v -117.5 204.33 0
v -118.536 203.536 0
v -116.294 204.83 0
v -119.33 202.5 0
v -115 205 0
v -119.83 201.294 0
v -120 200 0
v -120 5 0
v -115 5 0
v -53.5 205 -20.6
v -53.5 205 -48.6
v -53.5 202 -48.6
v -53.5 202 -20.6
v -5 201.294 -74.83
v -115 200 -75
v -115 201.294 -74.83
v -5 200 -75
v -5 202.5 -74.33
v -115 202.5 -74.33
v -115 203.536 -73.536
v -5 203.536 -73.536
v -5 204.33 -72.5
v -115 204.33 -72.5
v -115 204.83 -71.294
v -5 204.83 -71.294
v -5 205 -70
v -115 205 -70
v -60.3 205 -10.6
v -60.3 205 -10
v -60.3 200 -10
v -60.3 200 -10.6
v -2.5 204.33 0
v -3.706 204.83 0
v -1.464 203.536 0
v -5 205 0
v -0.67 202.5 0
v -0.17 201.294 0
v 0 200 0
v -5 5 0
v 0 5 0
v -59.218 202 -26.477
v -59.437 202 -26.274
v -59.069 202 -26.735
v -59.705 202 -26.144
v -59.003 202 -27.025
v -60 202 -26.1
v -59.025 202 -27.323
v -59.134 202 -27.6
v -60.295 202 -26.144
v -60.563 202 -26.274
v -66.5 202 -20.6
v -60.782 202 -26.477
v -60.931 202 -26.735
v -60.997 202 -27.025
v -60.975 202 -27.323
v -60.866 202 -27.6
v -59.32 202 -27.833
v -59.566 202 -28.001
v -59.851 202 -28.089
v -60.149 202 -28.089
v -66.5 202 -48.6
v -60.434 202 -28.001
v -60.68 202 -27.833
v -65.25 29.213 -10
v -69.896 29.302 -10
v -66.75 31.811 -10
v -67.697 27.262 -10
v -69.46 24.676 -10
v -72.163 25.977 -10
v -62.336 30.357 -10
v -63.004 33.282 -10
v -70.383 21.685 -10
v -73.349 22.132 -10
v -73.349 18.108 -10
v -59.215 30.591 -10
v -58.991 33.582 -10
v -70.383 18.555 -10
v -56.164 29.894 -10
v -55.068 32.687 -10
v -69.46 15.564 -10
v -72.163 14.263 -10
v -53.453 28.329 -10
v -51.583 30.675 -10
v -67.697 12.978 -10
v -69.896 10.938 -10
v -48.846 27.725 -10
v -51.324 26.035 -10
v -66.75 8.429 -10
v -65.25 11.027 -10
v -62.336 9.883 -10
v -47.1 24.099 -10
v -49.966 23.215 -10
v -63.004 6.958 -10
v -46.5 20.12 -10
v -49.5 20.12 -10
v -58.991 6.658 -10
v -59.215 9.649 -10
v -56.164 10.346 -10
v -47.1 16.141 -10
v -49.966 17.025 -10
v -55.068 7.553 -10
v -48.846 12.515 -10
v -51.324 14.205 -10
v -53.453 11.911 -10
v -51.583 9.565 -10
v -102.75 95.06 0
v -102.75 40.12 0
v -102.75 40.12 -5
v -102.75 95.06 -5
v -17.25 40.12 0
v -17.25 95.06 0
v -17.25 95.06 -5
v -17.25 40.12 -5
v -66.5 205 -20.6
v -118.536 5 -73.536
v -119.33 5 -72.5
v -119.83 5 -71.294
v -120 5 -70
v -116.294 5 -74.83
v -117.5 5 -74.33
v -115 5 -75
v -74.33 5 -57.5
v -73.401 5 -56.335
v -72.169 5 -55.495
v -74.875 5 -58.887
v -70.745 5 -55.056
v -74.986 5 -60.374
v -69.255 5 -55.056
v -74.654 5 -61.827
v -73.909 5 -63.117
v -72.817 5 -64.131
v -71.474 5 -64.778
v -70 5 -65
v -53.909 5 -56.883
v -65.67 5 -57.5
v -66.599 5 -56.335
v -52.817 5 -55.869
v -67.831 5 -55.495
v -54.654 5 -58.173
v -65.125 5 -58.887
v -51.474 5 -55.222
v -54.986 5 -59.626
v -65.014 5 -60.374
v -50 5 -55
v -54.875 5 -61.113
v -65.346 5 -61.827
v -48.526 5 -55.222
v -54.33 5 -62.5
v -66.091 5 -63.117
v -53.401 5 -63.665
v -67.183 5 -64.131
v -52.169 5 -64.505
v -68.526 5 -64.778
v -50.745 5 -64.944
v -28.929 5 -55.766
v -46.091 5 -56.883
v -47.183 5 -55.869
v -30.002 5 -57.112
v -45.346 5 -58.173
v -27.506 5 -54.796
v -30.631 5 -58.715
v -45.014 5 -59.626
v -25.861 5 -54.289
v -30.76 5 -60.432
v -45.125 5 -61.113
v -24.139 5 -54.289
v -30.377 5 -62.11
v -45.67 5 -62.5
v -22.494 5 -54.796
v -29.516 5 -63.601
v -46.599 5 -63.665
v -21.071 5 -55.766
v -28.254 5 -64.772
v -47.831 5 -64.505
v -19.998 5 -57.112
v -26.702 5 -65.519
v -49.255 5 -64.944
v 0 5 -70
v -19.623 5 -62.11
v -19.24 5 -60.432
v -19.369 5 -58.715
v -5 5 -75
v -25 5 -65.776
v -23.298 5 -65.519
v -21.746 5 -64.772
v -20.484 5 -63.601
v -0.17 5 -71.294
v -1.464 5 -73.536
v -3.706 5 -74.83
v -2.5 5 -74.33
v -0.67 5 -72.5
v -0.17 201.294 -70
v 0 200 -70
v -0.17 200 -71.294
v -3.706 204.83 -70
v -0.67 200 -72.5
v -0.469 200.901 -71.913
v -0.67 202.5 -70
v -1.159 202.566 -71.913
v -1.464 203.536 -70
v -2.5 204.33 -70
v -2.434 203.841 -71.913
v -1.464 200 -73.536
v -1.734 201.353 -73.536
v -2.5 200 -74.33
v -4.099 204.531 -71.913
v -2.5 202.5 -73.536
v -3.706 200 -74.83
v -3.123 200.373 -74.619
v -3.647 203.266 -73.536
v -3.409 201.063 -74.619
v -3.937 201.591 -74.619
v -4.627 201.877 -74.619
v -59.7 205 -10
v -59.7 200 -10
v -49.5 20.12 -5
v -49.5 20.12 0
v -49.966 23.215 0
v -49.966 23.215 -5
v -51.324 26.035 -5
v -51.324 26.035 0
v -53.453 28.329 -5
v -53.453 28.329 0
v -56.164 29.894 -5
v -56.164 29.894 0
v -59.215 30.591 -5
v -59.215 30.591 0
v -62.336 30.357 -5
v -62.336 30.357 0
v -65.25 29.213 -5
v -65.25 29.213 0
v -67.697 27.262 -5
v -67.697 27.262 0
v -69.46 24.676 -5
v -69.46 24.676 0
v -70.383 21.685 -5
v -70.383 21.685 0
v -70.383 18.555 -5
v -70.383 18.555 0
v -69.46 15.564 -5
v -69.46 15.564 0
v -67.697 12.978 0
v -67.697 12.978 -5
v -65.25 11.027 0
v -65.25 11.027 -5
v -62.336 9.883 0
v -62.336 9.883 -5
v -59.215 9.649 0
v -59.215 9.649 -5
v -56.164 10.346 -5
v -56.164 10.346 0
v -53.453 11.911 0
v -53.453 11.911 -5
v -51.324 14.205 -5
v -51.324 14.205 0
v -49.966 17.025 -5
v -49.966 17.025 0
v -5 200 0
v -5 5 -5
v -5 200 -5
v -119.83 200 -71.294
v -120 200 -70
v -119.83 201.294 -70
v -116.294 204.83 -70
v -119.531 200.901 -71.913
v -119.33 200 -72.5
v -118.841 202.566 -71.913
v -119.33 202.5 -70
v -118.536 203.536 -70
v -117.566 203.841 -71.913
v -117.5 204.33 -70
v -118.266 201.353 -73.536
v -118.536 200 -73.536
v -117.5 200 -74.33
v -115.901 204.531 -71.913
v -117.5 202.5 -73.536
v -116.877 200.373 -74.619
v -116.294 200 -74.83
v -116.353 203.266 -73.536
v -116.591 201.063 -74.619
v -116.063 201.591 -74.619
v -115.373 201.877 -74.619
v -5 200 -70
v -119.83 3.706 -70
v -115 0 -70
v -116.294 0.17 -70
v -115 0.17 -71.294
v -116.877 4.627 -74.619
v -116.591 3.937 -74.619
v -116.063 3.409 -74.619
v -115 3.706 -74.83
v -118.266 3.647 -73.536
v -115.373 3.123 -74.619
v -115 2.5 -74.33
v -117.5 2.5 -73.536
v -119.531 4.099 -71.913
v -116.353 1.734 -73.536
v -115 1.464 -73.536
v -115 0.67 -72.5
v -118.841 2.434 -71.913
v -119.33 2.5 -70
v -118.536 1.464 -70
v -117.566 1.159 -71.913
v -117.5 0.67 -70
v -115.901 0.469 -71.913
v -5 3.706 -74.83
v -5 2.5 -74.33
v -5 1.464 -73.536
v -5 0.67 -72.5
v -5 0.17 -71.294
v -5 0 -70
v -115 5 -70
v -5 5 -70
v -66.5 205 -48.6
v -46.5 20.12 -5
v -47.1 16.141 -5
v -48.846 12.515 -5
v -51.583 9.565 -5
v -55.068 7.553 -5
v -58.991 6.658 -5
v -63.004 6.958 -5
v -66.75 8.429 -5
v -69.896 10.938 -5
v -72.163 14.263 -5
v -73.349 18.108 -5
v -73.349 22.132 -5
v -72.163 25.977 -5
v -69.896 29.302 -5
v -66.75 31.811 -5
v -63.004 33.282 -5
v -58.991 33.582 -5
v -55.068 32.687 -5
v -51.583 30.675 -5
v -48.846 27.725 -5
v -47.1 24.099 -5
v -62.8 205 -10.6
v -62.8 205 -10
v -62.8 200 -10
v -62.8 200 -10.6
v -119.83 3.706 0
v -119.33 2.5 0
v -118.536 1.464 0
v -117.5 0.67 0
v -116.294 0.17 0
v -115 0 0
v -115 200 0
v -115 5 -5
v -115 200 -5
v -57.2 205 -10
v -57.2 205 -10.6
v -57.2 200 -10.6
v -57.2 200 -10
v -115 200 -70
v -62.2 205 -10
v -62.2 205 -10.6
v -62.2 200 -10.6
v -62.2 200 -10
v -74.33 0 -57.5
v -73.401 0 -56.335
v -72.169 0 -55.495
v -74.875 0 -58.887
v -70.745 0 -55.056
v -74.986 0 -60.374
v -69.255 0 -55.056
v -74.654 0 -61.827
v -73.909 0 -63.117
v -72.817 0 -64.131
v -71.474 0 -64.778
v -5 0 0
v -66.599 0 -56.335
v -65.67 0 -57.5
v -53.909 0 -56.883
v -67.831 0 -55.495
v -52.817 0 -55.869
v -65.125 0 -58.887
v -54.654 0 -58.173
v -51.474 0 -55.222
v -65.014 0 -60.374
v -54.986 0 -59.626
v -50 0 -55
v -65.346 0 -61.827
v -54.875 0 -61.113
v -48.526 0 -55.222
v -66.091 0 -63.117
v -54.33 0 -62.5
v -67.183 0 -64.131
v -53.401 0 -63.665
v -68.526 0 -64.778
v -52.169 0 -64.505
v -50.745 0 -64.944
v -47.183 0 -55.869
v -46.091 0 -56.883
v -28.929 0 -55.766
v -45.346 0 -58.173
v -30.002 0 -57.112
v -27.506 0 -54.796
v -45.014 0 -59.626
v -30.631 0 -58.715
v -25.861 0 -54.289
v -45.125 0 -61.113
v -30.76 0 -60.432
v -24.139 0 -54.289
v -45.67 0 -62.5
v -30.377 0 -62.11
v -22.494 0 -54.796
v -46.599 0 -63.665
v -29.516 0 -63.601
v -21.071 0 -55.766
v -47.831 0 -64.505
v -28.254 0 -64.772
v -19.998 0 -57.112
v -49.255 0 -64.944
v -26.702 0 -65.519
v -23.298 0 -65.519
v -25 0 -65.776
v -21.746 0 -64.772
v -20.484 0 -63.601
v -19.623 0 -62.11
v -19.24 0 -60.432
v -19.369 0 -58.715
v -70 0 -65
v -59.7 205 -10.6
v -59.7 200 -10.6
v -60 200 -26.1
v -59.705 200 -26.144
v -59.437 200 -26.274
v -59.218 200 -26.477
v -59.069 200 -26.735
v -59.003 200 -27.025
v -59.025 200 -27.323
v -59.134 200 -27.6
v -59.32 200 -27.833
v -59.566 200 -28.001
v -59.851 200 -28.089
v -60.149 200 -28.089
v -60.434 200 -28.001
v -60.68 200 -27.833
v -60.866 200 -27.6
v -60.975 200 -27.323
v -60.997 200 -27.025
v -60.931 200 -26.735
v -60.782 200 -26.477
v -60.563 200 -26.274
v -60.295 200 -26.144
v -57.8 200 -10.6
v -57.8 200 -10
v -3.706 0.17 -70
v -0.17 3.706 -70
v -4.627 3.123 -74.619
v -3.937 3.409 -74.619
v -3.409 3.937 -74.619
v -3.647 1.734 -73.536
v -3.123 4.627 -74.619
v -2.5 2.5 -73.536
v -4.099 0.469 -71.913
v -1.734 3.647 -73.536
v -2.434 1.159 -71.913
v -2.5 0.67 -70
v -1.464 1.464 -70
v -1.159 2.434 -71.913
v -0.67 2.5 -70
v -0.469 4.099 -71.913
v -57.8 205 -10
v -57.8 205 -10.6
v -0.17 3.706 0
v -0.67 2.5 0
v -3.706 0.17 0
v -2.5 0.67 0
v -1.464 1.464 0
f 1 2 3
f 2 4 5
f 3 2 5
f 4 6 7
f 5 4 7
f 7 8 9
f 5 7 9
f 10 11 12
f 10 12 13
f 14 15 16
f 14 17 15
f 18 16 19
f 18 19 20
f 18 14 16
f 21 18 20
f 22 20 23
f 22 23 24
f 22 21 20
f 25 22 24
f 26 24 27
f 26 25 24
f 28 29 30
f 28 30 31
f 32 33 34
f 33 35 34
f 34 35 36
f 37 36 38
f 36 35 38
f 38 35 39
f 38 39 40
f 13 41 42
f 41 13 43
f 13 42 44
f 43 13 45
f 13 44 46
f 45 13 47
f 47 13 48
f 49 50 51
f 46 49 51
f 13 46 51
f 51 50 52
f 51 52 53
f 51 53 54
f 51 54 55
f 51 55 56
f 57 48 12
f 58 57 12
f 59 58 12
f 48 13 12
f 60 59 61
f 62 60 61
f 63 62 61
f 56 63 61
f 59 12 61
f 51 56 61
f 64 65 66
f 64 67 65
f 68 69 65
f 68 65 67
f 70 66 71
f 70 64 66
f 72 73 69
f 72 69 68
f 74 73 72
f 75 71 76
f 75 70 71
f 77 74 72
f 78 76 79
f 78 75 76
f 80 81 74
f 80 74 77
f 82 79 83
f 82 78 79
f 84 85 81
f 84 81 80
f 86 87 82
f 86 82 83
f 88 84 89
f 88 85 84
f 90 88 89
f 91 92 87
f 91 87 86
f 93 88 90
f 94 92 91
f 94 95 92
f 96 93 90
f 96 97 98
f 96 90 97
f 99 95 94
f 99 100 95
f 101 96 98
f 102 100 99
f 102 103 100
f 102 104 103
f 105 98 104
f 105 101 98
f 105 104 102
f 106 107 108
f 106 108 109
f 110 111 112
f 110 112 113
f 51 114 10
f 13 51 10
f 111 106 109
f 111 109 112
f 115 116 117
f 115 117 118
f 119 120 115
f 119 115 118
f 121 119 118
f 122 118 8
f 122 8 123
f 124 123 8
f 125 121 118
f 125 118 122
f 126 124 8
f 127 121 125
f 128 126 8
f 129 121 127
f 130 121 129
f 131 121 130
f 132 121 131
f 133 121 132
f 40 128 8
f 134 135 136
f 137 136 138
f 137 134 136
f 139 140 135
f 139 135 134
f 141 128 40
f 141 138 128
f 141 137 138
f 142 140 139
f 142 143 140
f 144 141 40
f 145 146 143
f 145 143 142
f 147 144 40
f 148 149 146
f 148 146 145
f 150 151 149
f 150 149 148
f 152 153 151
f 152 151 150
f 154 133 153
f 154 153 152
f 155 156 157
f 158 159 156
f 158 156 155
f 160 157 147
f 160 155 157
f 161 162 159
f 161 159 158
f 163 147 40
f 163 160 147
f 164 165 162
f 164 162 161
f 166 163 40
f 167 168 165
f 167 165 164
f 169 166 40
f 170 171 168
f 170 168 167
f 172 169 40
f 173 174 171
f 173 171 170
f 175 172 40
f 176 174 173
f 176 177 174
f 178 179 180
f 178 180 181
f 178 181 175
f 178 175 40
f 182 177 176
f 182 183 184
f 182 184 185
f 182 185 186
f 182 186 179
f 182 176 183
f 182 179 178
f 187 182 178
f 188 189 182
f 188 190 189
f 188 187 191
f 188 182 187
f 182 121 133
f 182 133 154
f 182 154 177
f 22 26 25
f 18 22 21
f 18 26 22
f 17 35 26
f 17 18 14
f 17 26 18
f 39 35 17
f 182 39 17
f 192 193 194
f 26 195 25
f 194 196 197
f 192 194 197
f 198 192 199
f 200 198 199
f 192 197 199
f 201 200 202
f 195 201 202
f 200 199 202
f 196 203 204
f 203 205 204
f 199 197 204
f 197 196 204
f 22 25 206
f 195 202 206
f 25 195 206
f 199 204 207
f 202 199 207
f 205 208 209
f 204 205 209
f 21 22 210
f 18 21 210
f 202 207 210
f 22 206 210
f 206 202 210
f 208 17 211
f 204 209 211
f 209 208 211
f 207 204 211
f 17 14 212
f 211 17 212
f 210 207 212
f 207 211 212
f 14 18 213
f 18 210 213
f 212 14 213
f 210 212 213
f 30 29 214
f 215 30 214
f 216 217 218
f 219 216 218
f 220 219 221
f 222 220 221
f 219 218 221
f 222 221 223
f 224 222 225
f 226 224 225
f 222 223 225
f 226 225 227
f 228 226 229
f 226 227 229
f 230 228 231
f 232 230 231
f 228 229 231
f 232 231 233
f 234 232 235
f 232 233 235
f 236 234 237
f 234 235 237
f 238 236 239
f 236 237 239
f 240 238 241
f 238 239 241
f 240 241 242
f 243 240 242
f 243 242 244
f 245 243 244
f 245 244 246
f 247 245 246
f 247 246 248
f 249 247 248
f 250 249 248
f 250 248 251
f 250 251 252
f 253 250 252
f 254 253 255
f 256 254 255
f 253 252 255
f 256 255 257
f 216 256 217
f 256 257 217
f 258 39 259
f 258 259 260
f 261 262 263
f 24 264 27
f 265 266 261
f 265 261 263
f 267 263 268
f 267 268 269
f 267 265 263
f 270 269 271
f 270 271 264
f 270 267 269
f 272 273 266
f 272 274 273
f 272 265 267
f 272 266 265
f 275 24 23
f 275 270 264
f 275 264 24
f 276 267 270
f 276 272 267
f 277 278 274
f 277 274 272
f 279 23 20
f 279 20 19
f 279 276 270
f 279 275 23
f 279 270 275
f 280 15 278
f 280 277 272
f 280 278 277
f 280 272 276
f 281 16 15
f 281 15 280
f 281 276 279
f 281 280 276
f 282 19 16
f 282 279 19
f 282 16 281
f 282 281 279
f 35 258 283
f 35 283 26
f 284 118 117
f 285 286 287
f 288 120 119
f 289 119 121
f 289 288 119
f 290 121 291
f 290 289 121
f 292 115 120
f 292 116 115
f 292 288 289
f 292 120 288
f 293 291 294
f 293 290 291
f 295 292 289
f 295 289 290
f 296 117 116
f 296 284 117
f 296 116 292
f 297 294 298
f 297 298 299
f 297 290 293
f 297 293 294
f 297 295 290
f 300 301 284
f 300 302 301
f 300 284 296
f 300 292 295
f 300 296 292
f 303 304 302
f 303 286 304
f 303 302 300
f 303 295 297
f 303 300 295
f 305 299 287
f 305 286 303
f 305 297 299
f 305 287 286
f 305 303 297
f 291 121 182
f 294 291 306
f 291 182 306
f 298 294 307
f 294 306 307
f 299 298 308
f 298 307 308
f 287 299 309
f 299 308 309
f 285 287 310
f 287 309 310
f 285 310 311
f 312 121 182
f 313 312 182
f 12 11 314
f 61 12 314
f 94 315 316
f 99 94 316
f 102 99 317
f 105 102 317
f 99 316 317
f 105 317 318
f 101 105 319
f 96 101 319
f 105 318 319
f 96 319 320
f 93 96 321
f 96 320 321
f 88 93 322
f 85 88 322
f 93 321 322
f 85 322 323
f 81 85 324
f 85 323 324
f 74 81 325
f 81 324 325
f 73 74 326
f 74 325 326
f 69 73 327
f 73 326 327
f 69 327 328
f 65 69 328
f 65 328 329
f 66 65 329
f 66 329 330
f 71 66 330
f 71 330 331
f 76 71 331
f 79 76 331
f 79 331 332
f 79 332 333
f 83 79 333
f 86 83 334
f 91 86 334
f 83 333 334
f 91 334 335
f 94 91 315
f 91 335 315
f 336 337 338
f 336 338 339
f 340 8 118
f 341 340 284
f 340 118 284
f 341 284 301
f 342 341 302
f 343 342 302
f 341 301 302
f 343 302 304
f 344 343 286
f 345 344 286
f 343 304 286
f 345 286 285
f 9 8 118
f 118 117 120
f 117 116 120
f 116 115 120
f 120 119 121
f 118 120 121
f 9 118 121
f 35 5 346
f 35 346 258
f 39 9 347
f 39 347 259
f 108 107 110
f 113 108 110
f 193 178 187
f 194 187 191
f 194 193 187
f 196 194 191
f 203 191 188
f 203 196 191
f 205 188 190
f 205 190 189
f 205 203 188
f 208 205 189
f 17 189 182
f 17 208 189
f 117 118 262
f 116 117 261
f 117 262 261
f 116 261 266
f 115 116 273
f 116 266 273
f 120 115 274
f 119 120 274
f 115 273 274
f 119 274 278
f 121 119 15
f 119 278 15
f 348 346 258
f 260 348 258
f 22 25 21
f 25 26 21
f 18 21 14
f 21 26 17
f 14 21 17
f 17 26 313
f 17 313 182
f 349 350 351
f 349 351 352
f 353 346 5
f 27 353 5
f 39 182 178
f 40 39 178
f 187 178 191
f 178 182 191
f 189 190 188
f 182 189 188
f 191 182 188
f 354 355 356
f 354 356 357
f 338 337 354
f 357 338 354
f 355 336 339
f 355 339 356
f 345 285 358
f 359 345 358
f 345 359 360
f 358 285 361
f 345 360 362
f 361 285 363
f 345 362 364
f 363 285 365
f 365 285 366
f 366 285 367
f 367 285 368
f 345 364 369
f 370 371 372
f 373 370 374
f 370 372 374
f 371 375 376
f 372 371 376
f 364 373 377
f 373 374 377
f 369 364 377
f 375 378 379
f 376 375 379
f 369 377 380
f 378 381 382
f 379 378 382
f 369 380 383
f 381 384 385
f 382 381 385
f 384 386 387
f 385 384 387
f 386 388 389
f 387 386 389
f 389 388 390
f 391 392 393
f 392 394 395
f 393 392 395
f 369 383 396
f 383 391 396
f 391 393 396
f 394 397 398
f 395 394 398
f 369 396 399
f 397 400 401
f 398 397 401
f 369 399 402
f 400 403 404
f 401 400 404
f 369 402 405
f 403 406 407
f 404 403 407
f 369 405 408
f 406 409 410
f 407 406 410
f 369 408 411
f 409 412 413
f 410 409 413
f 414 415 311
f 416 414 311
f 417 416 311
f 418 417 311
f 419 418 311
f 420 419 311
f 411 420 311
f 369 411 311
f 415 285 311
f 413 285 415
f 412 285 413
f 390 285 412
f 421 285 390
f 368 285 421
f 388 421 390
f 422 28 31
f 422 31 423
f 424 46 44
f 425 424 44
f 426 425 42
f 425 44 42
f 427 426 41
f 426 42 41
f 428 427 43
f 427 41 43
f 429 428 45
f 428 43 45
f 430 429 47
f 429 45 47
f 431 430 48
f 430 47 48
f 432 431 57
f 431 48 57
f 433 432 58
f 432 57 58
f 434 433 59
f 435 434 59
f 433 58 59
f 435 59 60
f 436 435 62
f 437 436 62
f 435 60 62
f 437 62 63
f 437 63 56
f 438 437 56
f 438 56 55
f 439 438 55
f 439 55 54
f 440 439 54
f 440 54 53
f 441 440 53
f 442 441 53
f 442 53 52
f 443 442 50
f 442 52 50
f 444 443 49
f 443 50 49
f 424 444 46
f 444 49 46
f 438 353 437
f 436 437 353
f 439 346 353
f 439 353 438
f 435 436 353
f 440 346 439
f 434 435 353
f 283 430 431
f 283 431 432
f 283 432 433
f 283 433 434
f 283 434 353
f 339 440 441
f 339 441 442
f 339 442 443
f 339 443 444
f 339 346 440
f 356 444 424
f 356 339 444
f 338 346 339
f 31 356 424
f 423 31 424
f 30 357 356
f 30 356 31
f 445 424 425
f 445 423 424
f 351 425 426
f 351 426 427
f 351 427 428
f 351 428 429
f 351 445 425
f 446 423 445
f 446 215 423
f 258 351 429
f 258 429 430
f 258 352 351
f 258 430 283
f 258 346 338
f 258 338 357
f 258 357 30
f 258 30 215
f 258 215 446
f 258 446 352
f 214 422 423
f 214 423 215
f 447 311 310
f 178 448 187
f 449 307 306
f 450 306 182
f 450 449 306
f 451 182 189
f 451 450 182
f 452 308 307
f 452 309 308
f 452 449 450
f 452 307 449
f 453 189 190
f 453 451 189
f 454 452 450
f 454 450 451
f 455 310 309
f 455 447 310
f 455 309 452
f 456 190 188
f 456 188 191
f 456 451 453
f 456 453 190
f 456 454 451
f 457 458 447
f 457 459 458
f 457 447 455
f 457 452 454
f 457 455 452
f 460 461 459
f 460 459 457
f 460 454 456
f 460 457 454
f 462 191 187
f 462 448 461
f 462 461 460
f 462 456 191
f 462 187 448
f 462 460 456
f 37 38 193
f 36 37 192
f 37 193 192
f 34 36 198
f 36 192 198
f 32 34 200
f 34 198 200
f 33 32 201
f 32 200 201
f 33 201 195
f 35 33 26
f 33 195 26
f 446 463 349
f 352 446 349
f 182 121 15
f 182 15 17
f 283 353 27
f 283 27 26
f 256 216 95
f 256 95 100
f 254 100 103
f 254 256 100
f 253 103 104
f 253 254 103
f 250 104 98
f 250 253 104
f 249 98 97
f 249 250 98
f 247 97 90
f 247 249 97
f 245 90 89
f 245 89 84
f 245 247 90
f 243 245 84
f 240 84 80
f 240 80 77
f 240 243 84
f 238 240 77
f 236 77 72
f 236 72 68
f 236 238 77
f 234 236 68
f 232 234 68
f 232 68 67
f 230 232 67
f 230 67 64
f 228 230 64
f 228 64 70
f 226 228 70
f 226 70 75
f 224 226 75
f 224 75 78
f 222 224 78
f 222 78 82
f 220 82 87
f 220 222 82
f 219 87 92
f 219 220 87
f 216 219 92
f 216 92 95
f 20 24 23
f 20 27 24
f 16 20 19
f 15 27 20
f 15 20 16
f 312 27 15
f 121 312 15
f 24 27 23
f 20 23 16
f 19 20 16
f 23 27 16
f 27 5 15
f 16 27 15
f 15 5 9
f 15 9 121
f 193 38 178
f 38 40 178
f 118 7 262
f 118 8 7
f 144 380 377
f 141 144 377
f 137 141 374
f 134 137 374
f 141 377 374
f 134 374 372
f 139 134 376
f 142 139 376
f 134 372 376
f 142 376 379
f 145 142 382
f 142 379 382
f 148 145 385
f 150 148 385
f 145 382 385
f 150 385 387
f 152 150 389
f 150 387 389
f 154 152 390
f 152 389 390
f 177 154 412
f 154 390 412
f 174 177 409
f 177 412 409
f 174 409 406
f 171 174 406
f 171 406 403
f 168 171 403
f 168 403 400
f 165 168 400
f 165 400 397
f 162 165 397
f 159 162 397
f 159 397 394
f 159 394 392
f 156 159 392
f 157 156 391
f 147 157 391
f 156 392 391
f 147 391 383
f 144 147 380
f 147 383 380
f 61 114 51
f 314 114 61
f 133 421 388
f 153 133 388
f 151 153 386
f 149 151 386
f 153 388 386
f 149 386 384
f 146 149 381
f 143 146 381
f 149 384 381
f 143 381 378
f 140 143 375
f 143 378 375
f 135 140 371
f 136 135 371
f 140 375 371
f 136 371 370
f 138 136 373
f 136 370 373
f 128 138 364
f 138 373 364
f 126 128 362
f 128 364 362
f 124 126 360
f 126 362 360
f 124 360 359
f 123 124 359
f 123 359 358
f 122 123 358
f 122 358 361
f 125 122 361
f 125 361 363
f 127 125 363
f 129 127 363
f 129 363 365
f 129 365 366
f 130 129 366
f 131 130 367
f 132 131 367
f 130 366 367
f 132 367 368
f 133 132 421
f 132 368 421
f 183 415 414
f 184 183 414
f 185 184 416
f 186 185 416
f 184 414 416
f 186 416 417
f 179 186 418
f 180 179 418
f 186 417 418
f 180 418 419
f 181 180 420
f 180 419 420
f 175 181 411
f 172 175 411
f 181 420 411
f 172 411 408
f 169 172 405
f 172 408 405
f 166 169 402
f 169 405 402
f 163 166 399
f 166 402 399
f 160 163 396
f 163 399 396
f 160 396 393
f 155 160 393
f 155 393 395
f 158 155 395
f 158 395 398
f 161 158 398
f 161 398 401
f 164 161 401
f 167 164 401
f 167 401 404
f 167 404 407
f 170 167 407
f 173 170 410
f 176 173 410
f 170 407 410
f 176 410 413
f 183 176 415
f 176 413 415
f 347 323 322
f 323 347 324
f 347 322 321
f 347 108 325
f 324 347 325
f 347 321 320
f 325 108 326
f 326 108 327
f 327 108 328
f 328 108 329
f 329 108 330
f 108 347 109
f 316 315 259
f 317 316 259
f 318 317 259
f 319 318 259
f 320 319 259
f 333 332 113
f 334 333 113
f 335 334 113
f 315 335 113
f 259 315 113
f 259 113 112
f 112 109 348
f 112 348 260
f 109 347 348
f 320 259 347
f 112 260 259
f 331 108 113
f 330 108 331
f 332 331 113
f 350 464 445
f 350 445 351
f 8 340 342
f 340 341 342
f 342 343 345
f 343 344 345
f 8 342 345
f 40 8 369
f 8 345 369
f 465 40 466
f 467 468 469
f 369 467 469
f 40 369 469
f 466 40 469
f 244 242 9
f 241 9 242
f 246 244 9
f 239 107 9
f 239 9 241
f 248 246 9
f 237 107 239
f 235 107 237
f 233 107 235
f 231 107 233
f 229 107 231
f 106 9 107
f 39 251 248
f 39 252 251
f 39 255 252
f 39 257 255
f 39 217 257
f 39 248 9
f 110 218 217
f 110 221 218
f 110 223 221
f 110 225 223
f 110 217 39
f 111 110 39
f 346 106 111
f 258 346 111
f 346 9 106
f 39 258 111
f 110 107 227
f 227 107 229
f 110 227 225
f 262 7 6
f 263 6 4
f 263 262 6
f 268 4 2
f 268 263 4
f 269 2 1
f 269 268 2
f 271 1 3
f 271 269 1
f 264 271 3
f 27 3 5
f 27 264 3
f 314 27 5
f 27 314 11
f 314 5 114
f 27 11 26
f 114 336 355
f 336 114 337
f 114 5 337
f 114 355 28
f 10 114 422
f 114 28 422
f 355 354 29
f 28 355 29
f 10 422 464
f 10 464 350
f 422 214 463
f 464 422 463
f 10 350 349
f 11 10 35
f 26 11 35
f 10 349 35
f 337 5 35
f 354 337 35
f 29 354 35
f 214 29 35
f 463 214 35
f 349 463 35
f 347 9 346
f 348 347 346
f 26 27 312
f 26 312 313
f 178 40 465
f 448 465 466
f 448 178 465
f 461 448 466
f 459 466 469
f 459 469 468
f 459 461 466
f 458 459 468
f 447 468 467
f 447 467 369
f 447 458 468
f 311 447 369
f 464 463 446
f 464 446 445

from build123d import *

# Parameters (mm, degrees)
SKETCH5_W             = 120
SKETCH5_H             = 75
BOSS_EXTRUDE4_DEPTH   = 5
FILLET1_R             = 5
SKETCH7_W             = 5
SKETCH7_H             = 75
BOSS_EXTRUDE7_DEPTH   = 200
BOSS_EXTRUDE7_2_DEPTH = 200
FILLET3_R             = 5
SKETCH8_W             = 110
SKETCH8_H             = 5
BOSS_EXTRUDE8_DEPTH   = 200
FILLET5_R             = 5
BOSS_EXTRUDE9_REACH   = 251.098
SKETCH13_W            = 110
SKETCH13_H            = 5
FILLET7_R             = 5
FILLET8_R             = 5
FILLET9_R             = 5
FILLET10_R            = 5
SKETCH14_W            = 110
SKETCH14_H            = 195
BOSS_EXTRUDE10_DEPTH  = 5
SKETCH15_R            = 10.5
CUT_EXTRUDE8_DEPTH    = 5
SKETCH16_R            = 13.5
SKETCH16_R_2          = 10.5
BOSS_EXTRUDE11_DEPTH  = 5
SKETCH17_R            = 5
SKETCH17_R_2          = 5.77596
CUT_EXTRUDE9_DEPTH    = 5
CUT_EXTRUDE10_DEPTH   = 5
CUT_EXTRUDE11_DEPTH   = 3
SKETCH20_R            = 1
CUT_EXTRUDE12_DEPTH   = 2


with BuildPart() as part:
    # Sketch5 → Boss-Extrude4 (new body)
    with BuildSketch(Plane(origin=(0, 0, 0), x_dir=(1, 0, 0), z_dir=(0, 1, 0))):
        with Locations((-60, 37.5)):
            Rectangle(SKETCH5_W, SKETCH5_H)
    extrude(amount=BOSS_EXTRUDE4_DEPTH)

    # Fillet1
    fillet1_edges = [part.edges().sort_by_distance(p)[0] for p in [
        (0, 0, -37.5),
        (-120, 0, -37.5),
    ]]
    fillet(fillet1_edges, radius=FILLET1_R - 0.0001)  # a hair under: the kernel refuses the full size

    # Fillet10
    fillet10_edges = [part.edges().sort_by_distance(p)[0] for p in [
        (-60, 0, -75),
        (-118.535563195, 1.464436805, -75),
        (-1.464436805, 1.464436805, -75),
    ]]
    fillet(fillet10_edges, radius=FILLET10_R - 0.0001)  # a hair under: the kernel refuses the full size

    # Sketch17 → Cut-Extrude9 (cut)
    with BuildSketch(Plane.XZ):
        with Locations(Location((-70, -60, 0), (0, 0, 270))):
            Circle(SKETCH17_R)
        with Locations(Location((-50, -60, 0), (0, 0, 90))):
            Circle(SKETCH17_R)
        with Locations(Location((-25, -60, 0), (0, 0, 270))):
            Circle(SKETCH17_R_2)
    extrude(amount=-CUT_EXTRUDE9_DEPTH, mode=Mode.SUBTRACT)


with BuildPart() as body_2:
    # Sketch7 → Boss-Extrude7 (new body)
    with BuildSketch(Plane(origin=(0, 5, 0), x_dir=(1, 0, 0), z_dir=(0, 1, 0))):
        with Locations((-117.5, 37.5)):
            Rectangle(SKETCH7_W, SKETCH7_H)
    extrude(amount=BOSS_EXTRUDE7_DEPTH)

    # Fillet3
    fillet3_edges = [body_2.edges().sort_by_distance(p)[0] for p in [
        (-120, 205, -37.5),
    ]]
    fillet(fillet3_edges, radius=FILLET3_R - 0.0001)  # a hair under: the kernel refuses the full size

    # Fillet7
    fillet7_edges = [body_2.edges().sort_by_distance(p)[0] for p in [
        (-118.535563195, 203.535563195, -75),
        (-120, 102.50005, -75),
    ]]
    fillet(fillet7_edges, radius=FILLET7_R - 0.0001)  # a hair under: the kernel refuses the full size


with BuildPart() as body_3:
    # Sketch7 → Boss-Extrude7 2 (new body)
    with BuildSketch(Plane(origin=(0, 5, 0), x_dir=(1, 0, 0), z_dir=(0, 1, 0))):
        with Locations((-2.5, 37.5)):
            Rectangle(SKETCH7_W, SKETCH7_H)
    extrude(amount=BOSS_EXTRUDE7_2_DEPTH)

    # Fillet5
    fillet5_edges = [body_3.edges().sort_by_distance(p)[0] for p in [
        (0, 205, -37.5),
    ]]
    fillet(fillet5_edges, radius=FILLET5_R - 0.0001)  # a hair under: the kernel refuses the full size

    # Fillet8
    fillet8_edges = [body_3.edges().sort_by_distance(p)[0] for p in [
        (-1.464436805, 203.535563195, -75),
        (0, 102.50005, -75),
    ]]
    fillet(fillet8_edges, radius=FILLET8_R - 0.0001)  # a hair under: the kernel refuses the full size


with BuildPart() as body_4:
    # Sketch8 → Boss-Extrude8 (new body)
    with BuildSketch(Plane(origin=(0, 5, 0), x_dir=(1, 0, 0), z_dir=(0, 1, 0))):
        with Locations((-60, 72.5)):
            Rectangle(SKETCH8_W, SKETCH8_H)
    extrude(amount=BOSS_EXTRUDE8_DEPTH)


with BuildPart() as body_5:

    # Sketch13 → Boss-Extrude9 (new, up to next)
    with BuildSketch(Plane.XY, mode=Mode.PRIVATE) as boss_extrude9_sk1:
        with Locations((-60, 202.5)):
            Rectangle(SKETCH13_W, SKETCH13_H)
    boss_extrude9_tool1 = extrude(boss_extrude9_sk1.sketch, amount=-BOSS_EXTRUDE9_REACH, mode=Mode.PRIVATE) - body_4.part
    add(boss_extrude9_tool1.solids().sort_by_distance((-60, 202.5, 0))[0])

    # Sketch18 → Cut-Extrude10 (cut)
    with BuildSketch(Plane(origin=(0, 205, 0), x_dir=(1, 0, 0), z_dir=(0, 1, 0))):
        Polygon((-62.5, 10), (-62.8, 10), (-62.8, 10.6), (-62.2, 10.6), (-62.2, 10), align=None)
        Polygon((-59.7, 10.6), (-59.7, 10), (-60, 10), (-60.3, 10), (-60.3, 10.6), align=None)
        Polygon((-57.5, 10), (-57.8, 10), (-57.8, 10.6), (-57.2, 10.6), (-57.2, 10), align=None)
    extrude(amount=-CUT_EXTRUDE10_DEPTH, mode=Mode.SUBTRACT)

    # Sketch19 → Cut-Extrude11 (cut)
    with BuildSketch(Plane(origin=(0, 205, 0), x_dir=(1, 0, 0), z_dir=(0, 1, 0))):
        Polygon((-60, 20.6), (-66.5, 20.6), (-66.5, 48.6), (-60, 48.6), (-53.5, 48.6), (-53.5, 20.6), align=None)
    extrude(amount=-CUT_EXTRUDE11_DEPTH, mode=Mode.SUBTRACT)

    # Sketch20 → Cut-Extrude12 (cut)
    with BuildSketch(Plane(origin=(0, 202, 0), x_dir=(1, 0, 0), z_dir=(0, 1, 0))):
        with Locations(Location((-60, 27.1, 0), (0, 0, 270))):
            Circle(SKETCH20_R)
    extrude(amount=-CUT_EXTRUDE12_DEPTH, mode=Mode.SUBTRACT)


with BuildPart() as body_4_1:
    add(body_4.part)

    # Fillet9
    fillet9_edges = [body_4_1.edges().sort_by_distance(p)[0] for p in [
        (-60, 205, -75),
    ]]
    fillet(fillet9_edges, radius=FILLET9_R - 0.0001)  # a hair under: the kernel refuses the full size


with BuildPart() as body_6:
    # Sketch14 → Boss-Extrude10 (new body)
    with BuildSketch(Plane.XY):
        with Locations((-60, 102.5)):
            Rectangle(SKETCH14_W, SKETCH14_H)
    extrude(amount=-BOSS_EXTRUDE10_DEPTH)

    # Sketch15 → Cut-Extrude8 (cut)
    with BuildSketch(Plane.XY):
        with Locations((-60, 20.12)):
            Circle(SKETCH15_R)
        Polygon((-17.25, 95.06), (-17.25, 40.12), (-60, 40.12), (-102.75, 40.12), (-102.75, 95.06), align=None)
    extrude(amount=-CUT_EXTRUDE8_DEPTH, mode=Mode.SUBTRACT)

    # Sketch16 → Boss-Extrude11 (add)
    with BuildSketch(Plane(origin=(0, 0, -5), x_dir=(-1, 0, 0), z_dir=(0, 0, -1))):
        with Locations(Location((60, 20.12, 0), (0, 0, 180))):
            Circle(SKETCH16_R)
        with Locations(Location((60, 20.12, 0), (0, 0, 180))):
            Circle(SKETCH16_R_2, mode=Mode.SUBTRACT)
    extrude(amount=BOSS_EXTRUDE11_DEPTH)


solid = Compound([part.part, body_2.part, body_3.part, body_5.part, body_4_1.part, body_6.part])
